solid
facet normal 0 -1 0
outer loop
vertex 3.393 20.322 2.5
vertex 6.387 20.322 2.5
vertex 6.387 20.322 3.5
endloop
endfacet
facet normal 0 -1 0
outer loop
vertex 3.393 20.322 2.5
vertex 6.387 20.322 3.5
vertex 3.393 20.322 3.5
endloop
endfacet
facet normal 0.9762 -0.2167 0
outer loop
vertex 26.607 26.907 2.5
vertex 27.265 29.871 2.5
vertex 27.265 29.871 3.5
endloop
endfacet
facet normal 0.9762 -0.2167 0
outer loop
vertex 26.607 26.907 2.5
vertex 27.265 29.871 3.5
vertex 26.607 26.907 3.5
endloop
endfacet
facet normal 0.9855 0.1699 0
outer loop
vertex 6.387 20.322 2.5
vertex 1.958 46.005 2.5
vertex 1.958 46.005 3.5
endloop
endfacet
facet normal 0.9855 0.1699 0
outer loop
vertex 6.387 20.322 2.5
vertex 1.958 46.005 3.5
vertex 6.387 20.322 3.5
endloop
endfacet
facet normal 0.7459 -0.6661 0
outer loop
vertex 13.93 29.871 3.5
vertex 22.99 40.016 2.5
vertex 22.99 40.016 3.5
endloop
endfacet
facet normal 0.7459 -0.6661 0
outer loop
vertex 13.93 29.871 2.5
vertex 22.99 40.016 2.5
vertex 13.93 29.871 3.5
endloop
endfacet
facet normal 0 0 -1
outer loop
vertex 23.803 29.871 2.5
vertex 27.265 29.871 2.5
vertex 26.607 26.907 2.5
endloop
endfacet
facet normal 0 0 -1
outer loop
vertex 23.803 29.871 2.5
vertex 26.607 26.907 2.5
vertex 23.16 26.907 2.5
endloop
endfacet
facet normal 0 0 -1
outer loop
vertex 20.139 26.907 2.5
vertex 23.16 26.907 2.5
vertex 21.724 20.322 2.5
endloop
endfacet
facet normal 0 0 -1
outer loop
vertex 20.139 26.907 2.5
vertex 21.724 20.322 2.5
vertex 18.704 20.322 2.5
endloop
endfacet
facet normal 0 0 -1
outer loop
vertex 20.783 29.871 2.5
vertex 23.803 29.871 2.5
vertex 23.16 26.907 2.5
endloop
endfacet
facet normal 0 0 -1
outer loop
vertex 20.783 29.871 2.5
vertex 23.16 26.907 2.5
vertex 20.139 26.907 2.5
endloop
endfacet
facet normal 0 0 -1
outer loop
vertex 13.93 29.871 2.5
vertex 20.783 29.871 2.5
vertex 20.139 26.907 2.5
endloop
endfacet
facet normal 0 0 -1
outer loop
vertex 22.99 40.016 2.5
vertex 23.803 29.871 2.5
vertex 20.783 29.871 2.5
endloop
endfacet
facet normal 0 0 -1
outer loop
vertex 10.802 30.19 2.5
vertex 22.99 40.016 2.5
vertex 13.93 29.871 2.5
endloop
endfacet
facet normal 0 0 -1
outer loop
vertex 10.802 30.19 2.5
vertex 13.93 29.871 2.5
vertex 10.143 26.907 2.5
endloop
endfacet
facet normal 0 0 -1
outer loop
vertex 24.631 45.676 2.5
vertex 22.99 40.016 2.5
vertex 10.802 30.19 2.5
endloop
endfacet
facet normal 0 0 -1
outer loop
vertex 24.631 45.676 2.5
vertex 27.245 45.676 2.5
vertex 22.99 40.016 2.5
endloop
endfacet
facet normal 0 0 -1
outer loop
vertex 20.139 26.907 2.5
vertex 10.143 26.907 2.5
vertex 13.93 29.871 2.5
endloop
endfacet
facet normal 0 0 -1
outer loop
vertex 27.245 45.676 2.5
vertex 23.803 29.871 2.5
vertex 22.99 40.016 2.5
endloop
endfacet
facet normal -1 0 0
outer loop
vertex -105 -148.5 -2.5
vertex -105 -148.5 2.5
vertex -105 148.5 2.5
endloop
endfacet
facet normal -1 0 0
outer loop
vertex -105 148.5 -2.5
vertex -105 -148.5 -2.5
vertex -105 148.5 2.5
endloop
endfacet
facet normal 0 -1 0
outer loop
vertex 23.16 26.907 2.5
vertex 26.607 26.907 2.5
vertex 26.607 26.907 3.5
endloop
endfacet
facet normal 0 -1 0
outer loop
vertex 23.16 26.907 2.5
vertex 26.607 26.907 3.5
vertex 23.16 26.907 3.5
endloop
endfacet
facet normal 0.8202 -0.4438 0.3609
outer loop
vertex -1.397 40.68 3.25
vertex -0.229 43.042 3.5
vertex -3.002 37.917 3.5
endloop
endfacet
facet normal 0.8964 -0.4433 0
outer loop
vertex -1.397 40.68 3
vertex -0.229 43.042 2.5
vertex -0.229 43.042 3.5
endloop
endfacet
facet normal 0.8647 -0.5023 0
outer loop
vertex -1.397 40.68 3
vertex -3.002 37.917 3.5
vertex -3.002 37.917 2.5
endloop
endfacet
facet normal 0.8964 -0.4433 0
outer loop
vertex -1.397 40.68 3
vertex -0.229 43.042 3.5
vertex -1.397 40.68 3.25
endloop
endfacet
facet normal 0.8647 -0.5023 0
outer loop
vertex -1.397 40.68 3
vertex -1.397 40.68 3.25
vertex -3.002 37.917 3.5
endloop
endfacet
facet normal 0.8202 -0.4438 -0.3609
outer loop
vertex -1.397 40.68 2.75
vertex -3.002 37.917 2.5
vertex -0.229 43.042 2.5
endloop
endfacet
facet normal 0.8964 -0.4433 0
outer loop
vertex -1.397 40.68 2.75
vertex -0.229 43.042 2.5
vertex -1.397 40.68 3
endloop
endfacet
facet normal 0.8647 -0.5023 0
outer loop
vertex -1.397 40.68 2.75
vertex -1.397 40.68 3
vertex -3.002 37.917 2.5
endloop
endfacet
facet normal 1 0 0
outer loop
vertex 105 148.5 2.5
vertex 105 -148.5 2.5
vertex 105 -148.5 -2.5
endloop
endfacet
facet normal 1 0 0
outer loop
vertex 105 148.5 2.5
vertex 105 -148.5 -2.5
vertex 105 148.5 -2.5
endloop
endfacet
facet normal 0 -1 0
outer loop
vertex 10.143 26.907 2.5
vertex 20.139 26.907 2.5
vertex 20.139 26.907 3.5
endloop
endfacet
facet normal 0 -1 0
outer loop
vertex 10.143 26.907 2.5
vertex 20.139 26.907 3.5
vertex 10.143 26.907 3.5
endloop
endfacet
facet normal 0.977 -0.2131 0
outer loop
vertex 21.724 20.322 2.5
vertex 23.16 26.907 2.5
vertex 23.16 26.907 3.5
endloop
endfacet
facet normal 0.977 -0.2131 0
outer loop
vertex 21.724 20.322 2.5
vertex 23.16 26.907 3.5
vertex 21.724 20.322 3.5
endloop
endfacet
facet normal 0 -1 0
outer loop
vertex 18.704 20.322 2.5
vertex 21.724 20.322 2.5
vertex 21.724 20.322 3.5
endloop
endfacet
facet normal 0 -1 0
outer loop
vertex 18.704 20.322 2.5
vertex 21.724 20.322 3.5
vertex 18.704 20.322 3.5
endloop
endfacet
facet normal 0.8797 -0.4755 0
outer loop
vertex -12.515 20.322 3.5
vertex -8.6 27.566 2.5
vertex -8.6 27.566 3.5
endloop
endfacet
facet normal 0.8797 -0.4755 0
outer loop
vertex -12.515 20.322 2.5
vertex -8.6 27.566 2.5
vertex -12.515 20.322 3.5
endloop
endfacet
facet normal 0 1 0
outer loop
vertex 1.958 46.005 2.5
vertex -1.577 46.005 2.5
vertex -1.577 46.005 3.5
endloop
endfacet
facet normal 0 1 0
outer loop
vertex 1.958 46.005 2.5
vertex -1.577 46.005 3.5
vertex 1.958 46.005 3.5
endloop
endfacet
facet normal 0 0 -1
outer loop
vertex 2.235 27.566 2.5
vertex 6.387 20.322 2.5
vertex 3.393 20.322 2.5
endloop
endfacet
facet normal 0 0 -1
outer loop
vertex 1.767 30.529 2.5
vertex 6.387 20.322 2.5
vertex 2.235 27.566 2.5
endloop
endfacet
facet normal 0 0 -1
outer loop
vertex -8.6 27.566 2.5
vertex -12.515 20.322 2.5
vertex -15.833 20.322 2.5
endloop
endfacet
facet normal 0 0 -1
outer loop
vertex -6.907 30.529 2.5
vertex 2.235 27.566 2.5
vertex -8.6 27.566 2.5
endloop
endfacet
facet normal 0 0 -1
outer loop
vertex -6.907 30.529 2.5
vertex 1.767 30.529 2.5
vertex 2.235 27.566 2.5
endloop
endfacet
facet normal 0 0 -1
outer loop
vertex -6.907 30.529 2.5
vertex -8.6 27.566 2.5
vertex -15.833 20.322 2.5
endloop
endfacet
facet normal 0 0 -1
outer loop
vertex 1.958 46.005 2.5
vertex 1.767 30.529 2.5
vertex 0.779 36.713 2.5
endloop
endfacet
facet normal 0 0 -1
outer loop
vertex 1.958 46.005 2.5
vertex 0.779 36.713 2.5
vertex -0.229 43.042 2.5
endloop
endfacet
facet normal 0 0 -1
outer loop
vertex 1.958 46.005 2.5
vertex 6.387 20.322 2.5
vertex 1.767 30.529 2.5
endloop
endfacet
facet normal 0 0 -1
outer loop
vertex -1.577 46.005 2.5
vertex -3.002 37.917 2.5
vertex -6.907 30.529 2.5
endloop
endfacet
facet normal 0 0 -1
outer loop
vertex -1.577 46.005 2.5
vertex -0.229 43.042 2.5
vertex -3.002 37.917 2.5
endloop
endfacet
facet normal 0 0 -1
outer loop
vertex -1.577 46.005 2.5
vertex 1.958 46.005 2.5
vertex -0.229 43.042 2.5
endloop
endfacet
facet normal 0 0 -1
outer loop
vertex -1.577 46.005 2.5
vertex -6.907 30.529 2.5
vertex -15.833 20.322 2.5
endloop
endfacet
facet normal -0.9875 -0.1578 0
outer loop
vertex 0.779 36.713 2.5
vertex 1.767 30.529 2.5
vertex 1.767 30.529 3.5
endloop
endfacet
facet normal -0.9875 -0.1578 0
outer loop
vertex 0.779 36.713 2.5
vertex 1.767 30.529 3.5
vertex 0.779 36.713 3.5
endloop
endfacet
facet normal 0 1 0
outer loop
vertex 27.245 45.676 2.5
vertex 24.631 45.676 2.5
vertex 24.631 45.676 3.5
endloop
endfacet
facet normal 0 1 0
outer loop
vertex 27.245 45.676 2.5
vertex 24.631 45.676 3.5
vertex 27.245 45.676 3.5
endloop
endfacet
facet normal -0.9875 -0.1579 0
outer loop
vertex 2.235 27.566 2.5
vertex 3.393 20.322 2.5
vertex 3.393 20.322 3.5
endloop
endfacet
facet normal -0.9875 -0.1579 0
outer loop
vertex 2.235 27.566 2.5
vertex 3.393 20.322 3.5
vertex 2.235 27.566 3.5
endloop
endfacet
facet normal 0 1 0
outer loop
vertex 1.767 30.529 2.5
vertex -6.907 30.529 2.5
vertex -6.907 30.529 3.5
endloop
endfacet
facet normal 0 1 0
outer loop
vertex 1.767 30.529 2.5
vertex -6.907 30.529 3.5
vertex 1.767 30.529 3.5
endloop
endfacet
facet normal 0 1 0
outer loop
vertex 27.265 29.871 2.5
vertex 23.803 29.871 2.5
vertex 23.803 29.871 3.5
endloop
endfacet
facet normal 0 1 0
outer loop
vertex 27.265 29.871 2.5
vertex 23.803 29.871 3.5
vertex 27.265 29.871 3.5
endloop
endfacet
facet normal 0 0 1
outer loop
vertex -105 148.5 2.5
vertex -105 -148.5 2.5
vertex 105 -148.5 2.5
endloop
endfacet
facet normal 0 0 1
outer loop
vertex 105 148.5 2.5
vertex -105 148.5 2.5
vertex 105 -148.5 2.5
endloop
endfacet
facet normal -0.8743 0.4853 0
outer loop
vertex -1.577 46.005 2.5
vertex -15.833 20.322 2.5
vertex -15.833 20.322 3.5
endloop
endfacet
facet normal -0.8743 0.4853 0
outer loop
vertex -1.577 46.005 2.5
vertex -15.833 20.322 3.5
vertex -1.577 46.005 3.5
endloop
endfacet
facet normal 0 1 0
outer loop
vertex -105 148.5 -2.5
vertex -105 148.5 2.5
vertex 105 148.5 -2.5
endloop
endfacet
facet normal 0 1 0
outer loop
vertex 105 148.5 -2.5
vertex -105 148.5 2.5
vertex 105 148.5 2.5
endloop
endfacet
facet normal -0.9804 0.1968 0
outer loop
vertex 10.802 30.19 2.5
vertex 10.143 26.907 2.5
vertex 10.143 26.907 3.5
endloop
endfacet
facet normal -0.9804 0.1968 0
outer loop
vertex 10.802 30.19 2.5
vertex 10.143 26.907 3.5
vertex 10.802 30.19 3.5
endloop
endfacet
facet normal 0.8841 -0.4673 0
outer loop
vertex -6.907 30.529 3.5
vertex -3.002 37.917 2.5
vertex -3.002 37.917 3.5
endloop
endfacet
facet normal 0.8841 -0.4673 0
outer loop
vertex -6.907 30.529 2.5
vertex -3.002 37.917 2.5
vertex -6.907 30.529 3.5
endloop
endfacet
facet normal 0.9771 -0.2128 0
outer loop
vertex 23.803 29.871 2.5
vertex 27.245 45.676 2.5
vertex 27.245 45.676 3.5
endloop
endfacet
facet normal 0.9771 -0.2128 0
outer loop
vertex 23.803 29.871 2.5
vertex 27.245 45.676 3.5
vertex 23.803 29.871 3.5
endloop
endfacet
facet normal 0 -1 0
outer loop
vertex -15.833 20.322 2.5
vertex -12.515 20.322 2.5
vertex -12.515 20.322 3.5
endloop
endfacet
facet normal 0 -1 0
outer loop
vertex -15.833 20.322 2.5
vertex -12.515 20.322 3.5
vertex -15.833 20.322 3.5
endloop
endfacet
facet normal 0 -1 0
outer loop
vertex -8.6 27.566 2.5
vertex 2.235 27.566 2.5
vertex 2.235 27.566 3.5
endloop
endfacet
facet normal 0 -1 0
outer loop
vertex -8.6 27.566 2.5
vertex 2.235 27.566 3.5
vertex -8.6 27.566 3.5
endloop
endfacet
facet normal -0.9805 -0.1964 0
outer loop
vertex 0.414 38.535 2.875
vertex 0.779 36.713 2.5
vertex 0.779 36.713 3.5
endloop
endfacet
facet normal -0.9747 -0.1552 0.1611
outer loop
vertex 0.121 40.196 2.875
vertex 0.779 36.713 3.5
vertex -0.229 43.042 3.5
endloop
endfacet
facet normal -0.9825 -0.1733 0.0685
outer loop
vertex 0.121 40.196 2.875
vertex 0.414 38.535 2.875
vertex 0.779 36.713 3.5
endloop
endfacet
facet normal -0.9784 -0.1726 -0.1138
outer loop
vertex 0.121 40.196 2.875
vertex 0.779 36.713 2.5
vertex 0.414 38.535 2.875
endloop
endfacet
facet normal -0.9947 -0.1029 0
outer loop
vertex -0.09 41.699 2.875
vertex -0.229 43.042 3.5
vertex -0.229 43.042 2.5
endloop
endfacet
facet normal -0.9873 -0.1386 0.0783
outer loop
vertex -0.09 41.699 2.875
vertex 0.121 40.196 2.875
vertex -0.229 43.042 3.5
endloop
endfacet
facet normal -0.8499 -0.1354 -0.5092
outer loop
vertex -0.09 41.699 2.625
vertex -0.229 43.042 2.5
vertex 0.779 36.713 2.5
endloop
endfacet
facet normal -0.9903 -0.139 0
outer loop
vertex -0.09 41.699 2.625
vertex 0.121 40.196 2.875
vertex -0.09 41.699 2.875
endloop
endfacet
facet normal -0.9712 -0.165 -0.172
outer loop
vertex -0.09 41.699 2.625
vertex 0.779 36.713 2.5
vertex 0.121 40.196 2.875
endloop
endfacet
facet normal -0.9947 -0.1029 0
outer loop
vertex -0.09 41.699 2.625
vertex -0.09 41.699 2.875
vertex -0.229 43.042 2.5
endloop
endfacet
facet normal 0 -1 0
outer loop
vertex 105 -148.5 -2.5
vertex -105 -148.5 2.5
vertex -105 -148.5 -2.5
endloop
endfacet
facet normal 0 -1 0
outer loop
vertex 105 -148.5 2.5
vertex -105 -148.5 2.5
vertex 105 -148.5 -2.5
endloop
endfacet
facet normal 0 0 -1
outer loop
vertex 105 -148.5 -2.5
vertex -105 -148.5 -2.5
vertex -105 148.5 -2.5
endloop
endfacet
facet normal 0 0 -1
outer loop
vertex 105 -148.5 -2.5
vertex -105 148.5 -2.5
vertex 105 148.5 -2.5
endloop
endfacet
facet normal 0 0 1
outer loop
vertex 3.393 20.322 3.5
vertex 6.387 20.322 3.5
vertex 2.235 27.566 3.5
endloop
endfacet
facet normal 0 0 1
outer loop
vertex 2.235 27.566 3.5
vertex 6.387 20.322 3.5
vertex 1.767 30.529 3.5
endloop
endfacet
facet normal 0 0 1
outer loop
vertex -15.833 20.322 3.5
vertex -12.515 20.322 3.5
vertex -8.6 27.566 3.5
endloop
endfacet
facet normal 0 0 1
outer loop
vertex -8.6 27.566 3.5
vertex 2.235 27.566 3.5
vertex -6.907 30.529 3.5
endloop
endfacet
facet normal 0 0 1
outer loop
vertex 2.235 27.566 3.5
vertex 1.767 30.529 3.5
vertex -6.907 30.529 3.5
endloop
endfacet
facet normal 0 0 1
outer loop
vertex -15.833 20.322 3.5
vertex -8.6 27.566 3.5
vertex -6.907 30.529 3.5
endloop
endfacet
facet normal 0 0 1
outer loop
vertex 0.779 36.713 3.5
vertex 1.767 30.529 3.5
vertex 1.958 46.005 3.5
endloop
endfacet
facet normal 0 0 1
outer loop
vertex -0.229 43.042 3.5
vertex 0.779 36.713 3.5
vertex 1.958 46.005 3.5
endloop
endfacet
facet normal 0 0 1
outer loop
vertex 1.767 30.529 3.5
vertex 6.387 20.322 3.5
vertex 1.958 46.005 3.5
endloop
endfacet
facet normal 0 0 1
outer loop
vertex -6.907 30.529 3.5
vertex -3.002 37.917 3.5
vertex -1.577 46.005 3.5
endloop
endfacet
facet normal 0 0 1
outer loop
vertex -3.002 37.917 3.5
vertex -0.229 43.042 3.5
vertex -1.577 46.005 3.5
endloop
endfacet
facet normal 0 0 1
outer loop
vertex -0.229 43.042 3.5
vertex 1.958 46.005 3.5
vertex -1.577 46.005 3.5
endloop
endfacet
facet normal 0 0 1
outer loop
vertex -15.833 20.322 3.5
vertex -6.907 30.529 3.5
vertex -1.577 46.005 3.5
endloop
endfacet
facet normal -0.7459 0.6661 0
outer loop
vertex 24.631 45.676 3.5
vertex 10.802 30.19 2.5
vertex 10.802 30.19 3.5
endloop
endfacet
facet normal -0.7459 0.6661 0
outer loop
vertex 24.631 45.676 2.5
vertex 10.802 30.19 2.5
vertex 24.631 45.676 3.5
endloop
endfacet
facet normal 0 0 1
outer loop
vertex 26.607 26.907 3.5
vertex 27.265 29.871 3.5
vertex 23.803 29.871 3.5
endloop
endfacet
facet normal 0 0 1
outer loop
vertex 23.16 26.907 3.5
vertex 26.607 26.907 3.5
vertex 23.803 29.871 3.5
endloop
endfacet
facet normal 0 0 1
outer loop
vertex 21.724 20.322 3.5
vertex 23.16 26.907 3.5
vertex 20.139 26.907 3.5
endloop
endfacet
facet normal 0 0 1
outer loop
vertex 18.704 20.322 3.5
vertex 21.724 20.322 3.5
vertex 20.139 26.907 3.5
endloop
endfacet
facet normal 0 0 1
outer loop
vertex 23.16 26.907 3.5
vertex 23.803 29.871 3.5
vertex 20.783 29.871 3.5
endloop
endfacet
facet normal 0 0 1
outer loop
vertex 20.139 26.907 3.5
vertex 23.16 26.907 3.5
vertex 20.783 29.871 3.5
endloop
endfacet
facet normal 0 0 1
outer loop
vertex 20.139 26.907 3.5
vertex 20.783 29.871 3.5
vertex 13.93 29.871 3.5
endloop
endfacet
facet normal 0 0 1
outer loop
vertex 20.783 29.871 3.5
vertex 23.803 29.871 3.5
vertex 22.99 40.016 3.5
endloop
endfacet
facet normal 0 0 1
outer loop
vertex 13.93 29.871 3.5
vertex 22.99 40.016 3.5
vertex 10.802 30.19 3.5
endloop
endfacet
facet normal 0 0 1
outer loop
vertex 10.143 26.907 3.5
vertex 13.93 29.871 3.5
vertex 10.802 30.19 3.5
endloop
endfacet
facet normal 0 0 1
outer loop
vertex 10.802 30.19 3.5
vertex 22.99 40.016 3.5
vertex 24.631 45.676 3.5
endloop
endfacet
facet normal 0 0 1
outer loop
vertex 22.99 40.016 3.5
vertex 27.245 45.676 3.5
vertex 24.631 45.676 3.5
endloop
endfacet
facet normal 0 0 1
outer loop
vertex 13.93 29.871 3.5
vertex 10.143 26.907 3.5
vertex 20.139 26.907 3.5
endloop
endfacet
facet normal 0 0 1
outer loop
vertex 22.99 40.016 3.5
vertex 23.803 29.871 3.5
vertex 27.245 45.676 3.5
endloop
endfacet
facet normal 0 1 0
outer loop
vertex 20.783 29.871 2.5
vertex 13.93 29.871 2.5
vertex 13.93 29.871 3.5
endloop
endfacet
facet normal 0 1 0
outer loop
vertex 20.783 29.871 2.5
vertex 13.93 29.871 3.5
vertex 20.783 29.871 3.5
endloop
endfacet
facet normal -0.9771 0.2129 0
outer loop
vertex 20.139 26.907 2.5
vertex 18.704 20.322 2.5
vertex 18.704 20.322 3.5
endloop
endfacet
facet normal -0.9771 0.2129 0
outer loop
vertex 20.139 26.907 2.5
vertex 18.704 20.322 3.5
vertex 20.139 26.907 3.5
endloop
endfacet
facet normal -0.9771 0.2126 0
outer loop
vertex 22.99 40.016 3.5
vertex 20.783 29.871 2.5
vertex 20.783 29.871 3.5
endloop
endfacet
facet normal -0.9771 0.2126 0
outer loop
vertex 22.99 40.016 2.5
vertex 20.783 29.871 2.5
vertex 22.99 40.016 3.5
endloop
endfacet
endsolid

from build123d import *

# Parameters (mm, degrees)
SKETCH_1_W        = 210
SKETCH_1_H        = 297
EXTRUDE_1_DEPTH   = 2.5
EXTRUDE_4_DEPTH   = 1
EXTRUDE_4_2_DEPTH = 1


with BuildPart() as part:
    # Эскиз1 → Бобышка-Вытянуть1 (new, symmetric)
    with BuildSketch(Plane.XY):
        Rectangle(SKETCH_1_W, SKETCH_1_H)
    extrude(amount=EXTRUDE_1_DEPTH, both=True)


with BuildPart() as body_2:
    # Эскиз3 → Бобышка-Вытянуть4 (new body)
    with BuildSketch(Plane.XY.offset(2.5)):
        Polygon((-15.83342859, 20.32176214), (-1.576996147, 46.004948989), (1.957528966, 46.004948989), (6.387261314, 20.32176214), (3.392947462, 20.32176214), (2.235351901, 27.565737918), (-8.599742551, 27.565737918), (-12.514987982, 20.32176214), align=None)
        with BuildLine():
            Line((-6.907080597, 30.529182554), (1.767168807, 30.529182554))
            Line((1.767168807, 30.529182554), (0.779353929, 36.713315285))
            add(Edge.make_bspline(
                [(0.779353929, 36.713315285), (0.712533382, 37.023394355), (0.582081342, 37.628753776), (0.418647768, 38.521085999), (0.251500229, 39.369449286), (0.124242409, 40.180667833), (-0.001907587, 40.950882353), (-0.086357291, 41.68329044), (-0.176984948, 42.374744734), (-0.212021321, 42.823512834), (-0.229040427, 43.041504353)],
                knots=[0, 0, 0, 0, 1.187075157, 2.317496411, 3.39507795, 4.42283965, 5.390522706, 6.315610667, 7.18179882, 8, 8, 8, 8], degree=3))
            add(Edge.make_bspline(
                [(-0.229040427, 43.041504353), (-0.402495517, 42.662669814), (-0.768210165, 41.863930844), (-1.41336508, 40.634068736), (-2.16421726, 39.304320997), (-2.71499697, 38.392537906), (-3.002124904, 37.917214669)],
                knots=[0, 0, 0, 0, 0.85739934, 1.807750339, 2.857154497, 4, 4, 4, 4], degree=3))
            Line((-3.002124904, 37.917214669), (-6.907080597, 30.529182554))
        make_face(mode=Mode.SUBTRACT)
    extrude(amount=EXTRUDE_4_DEPTH)


with BuildPart() as body_3:
    # Эскиз3 → Extrude 4 2 (new body)
    with BuildSketch(Plane.XY.offset(2.5)):
        Polygon((18.704078084, 20.32176214), (20.139496579, 26.907194665), (10.143015801, 26.907194665), (10.801559053, 30.18962119), (24.630967356, 45.675677363), (27.24456089, 45.675677363), (23.802643422, 29.870639302), (27.265140367, 29.870639302), (26.606597114, 26.907194665), (23.159534777, 26.907194665), (21.724116281, 20.32176214), align=None)
        Polygon((20.782605224, 29.870639302), (22.989754094, 40.016321286), (13.929639503, 29.870639302), align=None, mode=Mode.SUBTRACT)
    extrude(amount=EXTRUDE_4_2_DEPTH)


solid = Compound([part.part, body_2.part, body_3.part])
